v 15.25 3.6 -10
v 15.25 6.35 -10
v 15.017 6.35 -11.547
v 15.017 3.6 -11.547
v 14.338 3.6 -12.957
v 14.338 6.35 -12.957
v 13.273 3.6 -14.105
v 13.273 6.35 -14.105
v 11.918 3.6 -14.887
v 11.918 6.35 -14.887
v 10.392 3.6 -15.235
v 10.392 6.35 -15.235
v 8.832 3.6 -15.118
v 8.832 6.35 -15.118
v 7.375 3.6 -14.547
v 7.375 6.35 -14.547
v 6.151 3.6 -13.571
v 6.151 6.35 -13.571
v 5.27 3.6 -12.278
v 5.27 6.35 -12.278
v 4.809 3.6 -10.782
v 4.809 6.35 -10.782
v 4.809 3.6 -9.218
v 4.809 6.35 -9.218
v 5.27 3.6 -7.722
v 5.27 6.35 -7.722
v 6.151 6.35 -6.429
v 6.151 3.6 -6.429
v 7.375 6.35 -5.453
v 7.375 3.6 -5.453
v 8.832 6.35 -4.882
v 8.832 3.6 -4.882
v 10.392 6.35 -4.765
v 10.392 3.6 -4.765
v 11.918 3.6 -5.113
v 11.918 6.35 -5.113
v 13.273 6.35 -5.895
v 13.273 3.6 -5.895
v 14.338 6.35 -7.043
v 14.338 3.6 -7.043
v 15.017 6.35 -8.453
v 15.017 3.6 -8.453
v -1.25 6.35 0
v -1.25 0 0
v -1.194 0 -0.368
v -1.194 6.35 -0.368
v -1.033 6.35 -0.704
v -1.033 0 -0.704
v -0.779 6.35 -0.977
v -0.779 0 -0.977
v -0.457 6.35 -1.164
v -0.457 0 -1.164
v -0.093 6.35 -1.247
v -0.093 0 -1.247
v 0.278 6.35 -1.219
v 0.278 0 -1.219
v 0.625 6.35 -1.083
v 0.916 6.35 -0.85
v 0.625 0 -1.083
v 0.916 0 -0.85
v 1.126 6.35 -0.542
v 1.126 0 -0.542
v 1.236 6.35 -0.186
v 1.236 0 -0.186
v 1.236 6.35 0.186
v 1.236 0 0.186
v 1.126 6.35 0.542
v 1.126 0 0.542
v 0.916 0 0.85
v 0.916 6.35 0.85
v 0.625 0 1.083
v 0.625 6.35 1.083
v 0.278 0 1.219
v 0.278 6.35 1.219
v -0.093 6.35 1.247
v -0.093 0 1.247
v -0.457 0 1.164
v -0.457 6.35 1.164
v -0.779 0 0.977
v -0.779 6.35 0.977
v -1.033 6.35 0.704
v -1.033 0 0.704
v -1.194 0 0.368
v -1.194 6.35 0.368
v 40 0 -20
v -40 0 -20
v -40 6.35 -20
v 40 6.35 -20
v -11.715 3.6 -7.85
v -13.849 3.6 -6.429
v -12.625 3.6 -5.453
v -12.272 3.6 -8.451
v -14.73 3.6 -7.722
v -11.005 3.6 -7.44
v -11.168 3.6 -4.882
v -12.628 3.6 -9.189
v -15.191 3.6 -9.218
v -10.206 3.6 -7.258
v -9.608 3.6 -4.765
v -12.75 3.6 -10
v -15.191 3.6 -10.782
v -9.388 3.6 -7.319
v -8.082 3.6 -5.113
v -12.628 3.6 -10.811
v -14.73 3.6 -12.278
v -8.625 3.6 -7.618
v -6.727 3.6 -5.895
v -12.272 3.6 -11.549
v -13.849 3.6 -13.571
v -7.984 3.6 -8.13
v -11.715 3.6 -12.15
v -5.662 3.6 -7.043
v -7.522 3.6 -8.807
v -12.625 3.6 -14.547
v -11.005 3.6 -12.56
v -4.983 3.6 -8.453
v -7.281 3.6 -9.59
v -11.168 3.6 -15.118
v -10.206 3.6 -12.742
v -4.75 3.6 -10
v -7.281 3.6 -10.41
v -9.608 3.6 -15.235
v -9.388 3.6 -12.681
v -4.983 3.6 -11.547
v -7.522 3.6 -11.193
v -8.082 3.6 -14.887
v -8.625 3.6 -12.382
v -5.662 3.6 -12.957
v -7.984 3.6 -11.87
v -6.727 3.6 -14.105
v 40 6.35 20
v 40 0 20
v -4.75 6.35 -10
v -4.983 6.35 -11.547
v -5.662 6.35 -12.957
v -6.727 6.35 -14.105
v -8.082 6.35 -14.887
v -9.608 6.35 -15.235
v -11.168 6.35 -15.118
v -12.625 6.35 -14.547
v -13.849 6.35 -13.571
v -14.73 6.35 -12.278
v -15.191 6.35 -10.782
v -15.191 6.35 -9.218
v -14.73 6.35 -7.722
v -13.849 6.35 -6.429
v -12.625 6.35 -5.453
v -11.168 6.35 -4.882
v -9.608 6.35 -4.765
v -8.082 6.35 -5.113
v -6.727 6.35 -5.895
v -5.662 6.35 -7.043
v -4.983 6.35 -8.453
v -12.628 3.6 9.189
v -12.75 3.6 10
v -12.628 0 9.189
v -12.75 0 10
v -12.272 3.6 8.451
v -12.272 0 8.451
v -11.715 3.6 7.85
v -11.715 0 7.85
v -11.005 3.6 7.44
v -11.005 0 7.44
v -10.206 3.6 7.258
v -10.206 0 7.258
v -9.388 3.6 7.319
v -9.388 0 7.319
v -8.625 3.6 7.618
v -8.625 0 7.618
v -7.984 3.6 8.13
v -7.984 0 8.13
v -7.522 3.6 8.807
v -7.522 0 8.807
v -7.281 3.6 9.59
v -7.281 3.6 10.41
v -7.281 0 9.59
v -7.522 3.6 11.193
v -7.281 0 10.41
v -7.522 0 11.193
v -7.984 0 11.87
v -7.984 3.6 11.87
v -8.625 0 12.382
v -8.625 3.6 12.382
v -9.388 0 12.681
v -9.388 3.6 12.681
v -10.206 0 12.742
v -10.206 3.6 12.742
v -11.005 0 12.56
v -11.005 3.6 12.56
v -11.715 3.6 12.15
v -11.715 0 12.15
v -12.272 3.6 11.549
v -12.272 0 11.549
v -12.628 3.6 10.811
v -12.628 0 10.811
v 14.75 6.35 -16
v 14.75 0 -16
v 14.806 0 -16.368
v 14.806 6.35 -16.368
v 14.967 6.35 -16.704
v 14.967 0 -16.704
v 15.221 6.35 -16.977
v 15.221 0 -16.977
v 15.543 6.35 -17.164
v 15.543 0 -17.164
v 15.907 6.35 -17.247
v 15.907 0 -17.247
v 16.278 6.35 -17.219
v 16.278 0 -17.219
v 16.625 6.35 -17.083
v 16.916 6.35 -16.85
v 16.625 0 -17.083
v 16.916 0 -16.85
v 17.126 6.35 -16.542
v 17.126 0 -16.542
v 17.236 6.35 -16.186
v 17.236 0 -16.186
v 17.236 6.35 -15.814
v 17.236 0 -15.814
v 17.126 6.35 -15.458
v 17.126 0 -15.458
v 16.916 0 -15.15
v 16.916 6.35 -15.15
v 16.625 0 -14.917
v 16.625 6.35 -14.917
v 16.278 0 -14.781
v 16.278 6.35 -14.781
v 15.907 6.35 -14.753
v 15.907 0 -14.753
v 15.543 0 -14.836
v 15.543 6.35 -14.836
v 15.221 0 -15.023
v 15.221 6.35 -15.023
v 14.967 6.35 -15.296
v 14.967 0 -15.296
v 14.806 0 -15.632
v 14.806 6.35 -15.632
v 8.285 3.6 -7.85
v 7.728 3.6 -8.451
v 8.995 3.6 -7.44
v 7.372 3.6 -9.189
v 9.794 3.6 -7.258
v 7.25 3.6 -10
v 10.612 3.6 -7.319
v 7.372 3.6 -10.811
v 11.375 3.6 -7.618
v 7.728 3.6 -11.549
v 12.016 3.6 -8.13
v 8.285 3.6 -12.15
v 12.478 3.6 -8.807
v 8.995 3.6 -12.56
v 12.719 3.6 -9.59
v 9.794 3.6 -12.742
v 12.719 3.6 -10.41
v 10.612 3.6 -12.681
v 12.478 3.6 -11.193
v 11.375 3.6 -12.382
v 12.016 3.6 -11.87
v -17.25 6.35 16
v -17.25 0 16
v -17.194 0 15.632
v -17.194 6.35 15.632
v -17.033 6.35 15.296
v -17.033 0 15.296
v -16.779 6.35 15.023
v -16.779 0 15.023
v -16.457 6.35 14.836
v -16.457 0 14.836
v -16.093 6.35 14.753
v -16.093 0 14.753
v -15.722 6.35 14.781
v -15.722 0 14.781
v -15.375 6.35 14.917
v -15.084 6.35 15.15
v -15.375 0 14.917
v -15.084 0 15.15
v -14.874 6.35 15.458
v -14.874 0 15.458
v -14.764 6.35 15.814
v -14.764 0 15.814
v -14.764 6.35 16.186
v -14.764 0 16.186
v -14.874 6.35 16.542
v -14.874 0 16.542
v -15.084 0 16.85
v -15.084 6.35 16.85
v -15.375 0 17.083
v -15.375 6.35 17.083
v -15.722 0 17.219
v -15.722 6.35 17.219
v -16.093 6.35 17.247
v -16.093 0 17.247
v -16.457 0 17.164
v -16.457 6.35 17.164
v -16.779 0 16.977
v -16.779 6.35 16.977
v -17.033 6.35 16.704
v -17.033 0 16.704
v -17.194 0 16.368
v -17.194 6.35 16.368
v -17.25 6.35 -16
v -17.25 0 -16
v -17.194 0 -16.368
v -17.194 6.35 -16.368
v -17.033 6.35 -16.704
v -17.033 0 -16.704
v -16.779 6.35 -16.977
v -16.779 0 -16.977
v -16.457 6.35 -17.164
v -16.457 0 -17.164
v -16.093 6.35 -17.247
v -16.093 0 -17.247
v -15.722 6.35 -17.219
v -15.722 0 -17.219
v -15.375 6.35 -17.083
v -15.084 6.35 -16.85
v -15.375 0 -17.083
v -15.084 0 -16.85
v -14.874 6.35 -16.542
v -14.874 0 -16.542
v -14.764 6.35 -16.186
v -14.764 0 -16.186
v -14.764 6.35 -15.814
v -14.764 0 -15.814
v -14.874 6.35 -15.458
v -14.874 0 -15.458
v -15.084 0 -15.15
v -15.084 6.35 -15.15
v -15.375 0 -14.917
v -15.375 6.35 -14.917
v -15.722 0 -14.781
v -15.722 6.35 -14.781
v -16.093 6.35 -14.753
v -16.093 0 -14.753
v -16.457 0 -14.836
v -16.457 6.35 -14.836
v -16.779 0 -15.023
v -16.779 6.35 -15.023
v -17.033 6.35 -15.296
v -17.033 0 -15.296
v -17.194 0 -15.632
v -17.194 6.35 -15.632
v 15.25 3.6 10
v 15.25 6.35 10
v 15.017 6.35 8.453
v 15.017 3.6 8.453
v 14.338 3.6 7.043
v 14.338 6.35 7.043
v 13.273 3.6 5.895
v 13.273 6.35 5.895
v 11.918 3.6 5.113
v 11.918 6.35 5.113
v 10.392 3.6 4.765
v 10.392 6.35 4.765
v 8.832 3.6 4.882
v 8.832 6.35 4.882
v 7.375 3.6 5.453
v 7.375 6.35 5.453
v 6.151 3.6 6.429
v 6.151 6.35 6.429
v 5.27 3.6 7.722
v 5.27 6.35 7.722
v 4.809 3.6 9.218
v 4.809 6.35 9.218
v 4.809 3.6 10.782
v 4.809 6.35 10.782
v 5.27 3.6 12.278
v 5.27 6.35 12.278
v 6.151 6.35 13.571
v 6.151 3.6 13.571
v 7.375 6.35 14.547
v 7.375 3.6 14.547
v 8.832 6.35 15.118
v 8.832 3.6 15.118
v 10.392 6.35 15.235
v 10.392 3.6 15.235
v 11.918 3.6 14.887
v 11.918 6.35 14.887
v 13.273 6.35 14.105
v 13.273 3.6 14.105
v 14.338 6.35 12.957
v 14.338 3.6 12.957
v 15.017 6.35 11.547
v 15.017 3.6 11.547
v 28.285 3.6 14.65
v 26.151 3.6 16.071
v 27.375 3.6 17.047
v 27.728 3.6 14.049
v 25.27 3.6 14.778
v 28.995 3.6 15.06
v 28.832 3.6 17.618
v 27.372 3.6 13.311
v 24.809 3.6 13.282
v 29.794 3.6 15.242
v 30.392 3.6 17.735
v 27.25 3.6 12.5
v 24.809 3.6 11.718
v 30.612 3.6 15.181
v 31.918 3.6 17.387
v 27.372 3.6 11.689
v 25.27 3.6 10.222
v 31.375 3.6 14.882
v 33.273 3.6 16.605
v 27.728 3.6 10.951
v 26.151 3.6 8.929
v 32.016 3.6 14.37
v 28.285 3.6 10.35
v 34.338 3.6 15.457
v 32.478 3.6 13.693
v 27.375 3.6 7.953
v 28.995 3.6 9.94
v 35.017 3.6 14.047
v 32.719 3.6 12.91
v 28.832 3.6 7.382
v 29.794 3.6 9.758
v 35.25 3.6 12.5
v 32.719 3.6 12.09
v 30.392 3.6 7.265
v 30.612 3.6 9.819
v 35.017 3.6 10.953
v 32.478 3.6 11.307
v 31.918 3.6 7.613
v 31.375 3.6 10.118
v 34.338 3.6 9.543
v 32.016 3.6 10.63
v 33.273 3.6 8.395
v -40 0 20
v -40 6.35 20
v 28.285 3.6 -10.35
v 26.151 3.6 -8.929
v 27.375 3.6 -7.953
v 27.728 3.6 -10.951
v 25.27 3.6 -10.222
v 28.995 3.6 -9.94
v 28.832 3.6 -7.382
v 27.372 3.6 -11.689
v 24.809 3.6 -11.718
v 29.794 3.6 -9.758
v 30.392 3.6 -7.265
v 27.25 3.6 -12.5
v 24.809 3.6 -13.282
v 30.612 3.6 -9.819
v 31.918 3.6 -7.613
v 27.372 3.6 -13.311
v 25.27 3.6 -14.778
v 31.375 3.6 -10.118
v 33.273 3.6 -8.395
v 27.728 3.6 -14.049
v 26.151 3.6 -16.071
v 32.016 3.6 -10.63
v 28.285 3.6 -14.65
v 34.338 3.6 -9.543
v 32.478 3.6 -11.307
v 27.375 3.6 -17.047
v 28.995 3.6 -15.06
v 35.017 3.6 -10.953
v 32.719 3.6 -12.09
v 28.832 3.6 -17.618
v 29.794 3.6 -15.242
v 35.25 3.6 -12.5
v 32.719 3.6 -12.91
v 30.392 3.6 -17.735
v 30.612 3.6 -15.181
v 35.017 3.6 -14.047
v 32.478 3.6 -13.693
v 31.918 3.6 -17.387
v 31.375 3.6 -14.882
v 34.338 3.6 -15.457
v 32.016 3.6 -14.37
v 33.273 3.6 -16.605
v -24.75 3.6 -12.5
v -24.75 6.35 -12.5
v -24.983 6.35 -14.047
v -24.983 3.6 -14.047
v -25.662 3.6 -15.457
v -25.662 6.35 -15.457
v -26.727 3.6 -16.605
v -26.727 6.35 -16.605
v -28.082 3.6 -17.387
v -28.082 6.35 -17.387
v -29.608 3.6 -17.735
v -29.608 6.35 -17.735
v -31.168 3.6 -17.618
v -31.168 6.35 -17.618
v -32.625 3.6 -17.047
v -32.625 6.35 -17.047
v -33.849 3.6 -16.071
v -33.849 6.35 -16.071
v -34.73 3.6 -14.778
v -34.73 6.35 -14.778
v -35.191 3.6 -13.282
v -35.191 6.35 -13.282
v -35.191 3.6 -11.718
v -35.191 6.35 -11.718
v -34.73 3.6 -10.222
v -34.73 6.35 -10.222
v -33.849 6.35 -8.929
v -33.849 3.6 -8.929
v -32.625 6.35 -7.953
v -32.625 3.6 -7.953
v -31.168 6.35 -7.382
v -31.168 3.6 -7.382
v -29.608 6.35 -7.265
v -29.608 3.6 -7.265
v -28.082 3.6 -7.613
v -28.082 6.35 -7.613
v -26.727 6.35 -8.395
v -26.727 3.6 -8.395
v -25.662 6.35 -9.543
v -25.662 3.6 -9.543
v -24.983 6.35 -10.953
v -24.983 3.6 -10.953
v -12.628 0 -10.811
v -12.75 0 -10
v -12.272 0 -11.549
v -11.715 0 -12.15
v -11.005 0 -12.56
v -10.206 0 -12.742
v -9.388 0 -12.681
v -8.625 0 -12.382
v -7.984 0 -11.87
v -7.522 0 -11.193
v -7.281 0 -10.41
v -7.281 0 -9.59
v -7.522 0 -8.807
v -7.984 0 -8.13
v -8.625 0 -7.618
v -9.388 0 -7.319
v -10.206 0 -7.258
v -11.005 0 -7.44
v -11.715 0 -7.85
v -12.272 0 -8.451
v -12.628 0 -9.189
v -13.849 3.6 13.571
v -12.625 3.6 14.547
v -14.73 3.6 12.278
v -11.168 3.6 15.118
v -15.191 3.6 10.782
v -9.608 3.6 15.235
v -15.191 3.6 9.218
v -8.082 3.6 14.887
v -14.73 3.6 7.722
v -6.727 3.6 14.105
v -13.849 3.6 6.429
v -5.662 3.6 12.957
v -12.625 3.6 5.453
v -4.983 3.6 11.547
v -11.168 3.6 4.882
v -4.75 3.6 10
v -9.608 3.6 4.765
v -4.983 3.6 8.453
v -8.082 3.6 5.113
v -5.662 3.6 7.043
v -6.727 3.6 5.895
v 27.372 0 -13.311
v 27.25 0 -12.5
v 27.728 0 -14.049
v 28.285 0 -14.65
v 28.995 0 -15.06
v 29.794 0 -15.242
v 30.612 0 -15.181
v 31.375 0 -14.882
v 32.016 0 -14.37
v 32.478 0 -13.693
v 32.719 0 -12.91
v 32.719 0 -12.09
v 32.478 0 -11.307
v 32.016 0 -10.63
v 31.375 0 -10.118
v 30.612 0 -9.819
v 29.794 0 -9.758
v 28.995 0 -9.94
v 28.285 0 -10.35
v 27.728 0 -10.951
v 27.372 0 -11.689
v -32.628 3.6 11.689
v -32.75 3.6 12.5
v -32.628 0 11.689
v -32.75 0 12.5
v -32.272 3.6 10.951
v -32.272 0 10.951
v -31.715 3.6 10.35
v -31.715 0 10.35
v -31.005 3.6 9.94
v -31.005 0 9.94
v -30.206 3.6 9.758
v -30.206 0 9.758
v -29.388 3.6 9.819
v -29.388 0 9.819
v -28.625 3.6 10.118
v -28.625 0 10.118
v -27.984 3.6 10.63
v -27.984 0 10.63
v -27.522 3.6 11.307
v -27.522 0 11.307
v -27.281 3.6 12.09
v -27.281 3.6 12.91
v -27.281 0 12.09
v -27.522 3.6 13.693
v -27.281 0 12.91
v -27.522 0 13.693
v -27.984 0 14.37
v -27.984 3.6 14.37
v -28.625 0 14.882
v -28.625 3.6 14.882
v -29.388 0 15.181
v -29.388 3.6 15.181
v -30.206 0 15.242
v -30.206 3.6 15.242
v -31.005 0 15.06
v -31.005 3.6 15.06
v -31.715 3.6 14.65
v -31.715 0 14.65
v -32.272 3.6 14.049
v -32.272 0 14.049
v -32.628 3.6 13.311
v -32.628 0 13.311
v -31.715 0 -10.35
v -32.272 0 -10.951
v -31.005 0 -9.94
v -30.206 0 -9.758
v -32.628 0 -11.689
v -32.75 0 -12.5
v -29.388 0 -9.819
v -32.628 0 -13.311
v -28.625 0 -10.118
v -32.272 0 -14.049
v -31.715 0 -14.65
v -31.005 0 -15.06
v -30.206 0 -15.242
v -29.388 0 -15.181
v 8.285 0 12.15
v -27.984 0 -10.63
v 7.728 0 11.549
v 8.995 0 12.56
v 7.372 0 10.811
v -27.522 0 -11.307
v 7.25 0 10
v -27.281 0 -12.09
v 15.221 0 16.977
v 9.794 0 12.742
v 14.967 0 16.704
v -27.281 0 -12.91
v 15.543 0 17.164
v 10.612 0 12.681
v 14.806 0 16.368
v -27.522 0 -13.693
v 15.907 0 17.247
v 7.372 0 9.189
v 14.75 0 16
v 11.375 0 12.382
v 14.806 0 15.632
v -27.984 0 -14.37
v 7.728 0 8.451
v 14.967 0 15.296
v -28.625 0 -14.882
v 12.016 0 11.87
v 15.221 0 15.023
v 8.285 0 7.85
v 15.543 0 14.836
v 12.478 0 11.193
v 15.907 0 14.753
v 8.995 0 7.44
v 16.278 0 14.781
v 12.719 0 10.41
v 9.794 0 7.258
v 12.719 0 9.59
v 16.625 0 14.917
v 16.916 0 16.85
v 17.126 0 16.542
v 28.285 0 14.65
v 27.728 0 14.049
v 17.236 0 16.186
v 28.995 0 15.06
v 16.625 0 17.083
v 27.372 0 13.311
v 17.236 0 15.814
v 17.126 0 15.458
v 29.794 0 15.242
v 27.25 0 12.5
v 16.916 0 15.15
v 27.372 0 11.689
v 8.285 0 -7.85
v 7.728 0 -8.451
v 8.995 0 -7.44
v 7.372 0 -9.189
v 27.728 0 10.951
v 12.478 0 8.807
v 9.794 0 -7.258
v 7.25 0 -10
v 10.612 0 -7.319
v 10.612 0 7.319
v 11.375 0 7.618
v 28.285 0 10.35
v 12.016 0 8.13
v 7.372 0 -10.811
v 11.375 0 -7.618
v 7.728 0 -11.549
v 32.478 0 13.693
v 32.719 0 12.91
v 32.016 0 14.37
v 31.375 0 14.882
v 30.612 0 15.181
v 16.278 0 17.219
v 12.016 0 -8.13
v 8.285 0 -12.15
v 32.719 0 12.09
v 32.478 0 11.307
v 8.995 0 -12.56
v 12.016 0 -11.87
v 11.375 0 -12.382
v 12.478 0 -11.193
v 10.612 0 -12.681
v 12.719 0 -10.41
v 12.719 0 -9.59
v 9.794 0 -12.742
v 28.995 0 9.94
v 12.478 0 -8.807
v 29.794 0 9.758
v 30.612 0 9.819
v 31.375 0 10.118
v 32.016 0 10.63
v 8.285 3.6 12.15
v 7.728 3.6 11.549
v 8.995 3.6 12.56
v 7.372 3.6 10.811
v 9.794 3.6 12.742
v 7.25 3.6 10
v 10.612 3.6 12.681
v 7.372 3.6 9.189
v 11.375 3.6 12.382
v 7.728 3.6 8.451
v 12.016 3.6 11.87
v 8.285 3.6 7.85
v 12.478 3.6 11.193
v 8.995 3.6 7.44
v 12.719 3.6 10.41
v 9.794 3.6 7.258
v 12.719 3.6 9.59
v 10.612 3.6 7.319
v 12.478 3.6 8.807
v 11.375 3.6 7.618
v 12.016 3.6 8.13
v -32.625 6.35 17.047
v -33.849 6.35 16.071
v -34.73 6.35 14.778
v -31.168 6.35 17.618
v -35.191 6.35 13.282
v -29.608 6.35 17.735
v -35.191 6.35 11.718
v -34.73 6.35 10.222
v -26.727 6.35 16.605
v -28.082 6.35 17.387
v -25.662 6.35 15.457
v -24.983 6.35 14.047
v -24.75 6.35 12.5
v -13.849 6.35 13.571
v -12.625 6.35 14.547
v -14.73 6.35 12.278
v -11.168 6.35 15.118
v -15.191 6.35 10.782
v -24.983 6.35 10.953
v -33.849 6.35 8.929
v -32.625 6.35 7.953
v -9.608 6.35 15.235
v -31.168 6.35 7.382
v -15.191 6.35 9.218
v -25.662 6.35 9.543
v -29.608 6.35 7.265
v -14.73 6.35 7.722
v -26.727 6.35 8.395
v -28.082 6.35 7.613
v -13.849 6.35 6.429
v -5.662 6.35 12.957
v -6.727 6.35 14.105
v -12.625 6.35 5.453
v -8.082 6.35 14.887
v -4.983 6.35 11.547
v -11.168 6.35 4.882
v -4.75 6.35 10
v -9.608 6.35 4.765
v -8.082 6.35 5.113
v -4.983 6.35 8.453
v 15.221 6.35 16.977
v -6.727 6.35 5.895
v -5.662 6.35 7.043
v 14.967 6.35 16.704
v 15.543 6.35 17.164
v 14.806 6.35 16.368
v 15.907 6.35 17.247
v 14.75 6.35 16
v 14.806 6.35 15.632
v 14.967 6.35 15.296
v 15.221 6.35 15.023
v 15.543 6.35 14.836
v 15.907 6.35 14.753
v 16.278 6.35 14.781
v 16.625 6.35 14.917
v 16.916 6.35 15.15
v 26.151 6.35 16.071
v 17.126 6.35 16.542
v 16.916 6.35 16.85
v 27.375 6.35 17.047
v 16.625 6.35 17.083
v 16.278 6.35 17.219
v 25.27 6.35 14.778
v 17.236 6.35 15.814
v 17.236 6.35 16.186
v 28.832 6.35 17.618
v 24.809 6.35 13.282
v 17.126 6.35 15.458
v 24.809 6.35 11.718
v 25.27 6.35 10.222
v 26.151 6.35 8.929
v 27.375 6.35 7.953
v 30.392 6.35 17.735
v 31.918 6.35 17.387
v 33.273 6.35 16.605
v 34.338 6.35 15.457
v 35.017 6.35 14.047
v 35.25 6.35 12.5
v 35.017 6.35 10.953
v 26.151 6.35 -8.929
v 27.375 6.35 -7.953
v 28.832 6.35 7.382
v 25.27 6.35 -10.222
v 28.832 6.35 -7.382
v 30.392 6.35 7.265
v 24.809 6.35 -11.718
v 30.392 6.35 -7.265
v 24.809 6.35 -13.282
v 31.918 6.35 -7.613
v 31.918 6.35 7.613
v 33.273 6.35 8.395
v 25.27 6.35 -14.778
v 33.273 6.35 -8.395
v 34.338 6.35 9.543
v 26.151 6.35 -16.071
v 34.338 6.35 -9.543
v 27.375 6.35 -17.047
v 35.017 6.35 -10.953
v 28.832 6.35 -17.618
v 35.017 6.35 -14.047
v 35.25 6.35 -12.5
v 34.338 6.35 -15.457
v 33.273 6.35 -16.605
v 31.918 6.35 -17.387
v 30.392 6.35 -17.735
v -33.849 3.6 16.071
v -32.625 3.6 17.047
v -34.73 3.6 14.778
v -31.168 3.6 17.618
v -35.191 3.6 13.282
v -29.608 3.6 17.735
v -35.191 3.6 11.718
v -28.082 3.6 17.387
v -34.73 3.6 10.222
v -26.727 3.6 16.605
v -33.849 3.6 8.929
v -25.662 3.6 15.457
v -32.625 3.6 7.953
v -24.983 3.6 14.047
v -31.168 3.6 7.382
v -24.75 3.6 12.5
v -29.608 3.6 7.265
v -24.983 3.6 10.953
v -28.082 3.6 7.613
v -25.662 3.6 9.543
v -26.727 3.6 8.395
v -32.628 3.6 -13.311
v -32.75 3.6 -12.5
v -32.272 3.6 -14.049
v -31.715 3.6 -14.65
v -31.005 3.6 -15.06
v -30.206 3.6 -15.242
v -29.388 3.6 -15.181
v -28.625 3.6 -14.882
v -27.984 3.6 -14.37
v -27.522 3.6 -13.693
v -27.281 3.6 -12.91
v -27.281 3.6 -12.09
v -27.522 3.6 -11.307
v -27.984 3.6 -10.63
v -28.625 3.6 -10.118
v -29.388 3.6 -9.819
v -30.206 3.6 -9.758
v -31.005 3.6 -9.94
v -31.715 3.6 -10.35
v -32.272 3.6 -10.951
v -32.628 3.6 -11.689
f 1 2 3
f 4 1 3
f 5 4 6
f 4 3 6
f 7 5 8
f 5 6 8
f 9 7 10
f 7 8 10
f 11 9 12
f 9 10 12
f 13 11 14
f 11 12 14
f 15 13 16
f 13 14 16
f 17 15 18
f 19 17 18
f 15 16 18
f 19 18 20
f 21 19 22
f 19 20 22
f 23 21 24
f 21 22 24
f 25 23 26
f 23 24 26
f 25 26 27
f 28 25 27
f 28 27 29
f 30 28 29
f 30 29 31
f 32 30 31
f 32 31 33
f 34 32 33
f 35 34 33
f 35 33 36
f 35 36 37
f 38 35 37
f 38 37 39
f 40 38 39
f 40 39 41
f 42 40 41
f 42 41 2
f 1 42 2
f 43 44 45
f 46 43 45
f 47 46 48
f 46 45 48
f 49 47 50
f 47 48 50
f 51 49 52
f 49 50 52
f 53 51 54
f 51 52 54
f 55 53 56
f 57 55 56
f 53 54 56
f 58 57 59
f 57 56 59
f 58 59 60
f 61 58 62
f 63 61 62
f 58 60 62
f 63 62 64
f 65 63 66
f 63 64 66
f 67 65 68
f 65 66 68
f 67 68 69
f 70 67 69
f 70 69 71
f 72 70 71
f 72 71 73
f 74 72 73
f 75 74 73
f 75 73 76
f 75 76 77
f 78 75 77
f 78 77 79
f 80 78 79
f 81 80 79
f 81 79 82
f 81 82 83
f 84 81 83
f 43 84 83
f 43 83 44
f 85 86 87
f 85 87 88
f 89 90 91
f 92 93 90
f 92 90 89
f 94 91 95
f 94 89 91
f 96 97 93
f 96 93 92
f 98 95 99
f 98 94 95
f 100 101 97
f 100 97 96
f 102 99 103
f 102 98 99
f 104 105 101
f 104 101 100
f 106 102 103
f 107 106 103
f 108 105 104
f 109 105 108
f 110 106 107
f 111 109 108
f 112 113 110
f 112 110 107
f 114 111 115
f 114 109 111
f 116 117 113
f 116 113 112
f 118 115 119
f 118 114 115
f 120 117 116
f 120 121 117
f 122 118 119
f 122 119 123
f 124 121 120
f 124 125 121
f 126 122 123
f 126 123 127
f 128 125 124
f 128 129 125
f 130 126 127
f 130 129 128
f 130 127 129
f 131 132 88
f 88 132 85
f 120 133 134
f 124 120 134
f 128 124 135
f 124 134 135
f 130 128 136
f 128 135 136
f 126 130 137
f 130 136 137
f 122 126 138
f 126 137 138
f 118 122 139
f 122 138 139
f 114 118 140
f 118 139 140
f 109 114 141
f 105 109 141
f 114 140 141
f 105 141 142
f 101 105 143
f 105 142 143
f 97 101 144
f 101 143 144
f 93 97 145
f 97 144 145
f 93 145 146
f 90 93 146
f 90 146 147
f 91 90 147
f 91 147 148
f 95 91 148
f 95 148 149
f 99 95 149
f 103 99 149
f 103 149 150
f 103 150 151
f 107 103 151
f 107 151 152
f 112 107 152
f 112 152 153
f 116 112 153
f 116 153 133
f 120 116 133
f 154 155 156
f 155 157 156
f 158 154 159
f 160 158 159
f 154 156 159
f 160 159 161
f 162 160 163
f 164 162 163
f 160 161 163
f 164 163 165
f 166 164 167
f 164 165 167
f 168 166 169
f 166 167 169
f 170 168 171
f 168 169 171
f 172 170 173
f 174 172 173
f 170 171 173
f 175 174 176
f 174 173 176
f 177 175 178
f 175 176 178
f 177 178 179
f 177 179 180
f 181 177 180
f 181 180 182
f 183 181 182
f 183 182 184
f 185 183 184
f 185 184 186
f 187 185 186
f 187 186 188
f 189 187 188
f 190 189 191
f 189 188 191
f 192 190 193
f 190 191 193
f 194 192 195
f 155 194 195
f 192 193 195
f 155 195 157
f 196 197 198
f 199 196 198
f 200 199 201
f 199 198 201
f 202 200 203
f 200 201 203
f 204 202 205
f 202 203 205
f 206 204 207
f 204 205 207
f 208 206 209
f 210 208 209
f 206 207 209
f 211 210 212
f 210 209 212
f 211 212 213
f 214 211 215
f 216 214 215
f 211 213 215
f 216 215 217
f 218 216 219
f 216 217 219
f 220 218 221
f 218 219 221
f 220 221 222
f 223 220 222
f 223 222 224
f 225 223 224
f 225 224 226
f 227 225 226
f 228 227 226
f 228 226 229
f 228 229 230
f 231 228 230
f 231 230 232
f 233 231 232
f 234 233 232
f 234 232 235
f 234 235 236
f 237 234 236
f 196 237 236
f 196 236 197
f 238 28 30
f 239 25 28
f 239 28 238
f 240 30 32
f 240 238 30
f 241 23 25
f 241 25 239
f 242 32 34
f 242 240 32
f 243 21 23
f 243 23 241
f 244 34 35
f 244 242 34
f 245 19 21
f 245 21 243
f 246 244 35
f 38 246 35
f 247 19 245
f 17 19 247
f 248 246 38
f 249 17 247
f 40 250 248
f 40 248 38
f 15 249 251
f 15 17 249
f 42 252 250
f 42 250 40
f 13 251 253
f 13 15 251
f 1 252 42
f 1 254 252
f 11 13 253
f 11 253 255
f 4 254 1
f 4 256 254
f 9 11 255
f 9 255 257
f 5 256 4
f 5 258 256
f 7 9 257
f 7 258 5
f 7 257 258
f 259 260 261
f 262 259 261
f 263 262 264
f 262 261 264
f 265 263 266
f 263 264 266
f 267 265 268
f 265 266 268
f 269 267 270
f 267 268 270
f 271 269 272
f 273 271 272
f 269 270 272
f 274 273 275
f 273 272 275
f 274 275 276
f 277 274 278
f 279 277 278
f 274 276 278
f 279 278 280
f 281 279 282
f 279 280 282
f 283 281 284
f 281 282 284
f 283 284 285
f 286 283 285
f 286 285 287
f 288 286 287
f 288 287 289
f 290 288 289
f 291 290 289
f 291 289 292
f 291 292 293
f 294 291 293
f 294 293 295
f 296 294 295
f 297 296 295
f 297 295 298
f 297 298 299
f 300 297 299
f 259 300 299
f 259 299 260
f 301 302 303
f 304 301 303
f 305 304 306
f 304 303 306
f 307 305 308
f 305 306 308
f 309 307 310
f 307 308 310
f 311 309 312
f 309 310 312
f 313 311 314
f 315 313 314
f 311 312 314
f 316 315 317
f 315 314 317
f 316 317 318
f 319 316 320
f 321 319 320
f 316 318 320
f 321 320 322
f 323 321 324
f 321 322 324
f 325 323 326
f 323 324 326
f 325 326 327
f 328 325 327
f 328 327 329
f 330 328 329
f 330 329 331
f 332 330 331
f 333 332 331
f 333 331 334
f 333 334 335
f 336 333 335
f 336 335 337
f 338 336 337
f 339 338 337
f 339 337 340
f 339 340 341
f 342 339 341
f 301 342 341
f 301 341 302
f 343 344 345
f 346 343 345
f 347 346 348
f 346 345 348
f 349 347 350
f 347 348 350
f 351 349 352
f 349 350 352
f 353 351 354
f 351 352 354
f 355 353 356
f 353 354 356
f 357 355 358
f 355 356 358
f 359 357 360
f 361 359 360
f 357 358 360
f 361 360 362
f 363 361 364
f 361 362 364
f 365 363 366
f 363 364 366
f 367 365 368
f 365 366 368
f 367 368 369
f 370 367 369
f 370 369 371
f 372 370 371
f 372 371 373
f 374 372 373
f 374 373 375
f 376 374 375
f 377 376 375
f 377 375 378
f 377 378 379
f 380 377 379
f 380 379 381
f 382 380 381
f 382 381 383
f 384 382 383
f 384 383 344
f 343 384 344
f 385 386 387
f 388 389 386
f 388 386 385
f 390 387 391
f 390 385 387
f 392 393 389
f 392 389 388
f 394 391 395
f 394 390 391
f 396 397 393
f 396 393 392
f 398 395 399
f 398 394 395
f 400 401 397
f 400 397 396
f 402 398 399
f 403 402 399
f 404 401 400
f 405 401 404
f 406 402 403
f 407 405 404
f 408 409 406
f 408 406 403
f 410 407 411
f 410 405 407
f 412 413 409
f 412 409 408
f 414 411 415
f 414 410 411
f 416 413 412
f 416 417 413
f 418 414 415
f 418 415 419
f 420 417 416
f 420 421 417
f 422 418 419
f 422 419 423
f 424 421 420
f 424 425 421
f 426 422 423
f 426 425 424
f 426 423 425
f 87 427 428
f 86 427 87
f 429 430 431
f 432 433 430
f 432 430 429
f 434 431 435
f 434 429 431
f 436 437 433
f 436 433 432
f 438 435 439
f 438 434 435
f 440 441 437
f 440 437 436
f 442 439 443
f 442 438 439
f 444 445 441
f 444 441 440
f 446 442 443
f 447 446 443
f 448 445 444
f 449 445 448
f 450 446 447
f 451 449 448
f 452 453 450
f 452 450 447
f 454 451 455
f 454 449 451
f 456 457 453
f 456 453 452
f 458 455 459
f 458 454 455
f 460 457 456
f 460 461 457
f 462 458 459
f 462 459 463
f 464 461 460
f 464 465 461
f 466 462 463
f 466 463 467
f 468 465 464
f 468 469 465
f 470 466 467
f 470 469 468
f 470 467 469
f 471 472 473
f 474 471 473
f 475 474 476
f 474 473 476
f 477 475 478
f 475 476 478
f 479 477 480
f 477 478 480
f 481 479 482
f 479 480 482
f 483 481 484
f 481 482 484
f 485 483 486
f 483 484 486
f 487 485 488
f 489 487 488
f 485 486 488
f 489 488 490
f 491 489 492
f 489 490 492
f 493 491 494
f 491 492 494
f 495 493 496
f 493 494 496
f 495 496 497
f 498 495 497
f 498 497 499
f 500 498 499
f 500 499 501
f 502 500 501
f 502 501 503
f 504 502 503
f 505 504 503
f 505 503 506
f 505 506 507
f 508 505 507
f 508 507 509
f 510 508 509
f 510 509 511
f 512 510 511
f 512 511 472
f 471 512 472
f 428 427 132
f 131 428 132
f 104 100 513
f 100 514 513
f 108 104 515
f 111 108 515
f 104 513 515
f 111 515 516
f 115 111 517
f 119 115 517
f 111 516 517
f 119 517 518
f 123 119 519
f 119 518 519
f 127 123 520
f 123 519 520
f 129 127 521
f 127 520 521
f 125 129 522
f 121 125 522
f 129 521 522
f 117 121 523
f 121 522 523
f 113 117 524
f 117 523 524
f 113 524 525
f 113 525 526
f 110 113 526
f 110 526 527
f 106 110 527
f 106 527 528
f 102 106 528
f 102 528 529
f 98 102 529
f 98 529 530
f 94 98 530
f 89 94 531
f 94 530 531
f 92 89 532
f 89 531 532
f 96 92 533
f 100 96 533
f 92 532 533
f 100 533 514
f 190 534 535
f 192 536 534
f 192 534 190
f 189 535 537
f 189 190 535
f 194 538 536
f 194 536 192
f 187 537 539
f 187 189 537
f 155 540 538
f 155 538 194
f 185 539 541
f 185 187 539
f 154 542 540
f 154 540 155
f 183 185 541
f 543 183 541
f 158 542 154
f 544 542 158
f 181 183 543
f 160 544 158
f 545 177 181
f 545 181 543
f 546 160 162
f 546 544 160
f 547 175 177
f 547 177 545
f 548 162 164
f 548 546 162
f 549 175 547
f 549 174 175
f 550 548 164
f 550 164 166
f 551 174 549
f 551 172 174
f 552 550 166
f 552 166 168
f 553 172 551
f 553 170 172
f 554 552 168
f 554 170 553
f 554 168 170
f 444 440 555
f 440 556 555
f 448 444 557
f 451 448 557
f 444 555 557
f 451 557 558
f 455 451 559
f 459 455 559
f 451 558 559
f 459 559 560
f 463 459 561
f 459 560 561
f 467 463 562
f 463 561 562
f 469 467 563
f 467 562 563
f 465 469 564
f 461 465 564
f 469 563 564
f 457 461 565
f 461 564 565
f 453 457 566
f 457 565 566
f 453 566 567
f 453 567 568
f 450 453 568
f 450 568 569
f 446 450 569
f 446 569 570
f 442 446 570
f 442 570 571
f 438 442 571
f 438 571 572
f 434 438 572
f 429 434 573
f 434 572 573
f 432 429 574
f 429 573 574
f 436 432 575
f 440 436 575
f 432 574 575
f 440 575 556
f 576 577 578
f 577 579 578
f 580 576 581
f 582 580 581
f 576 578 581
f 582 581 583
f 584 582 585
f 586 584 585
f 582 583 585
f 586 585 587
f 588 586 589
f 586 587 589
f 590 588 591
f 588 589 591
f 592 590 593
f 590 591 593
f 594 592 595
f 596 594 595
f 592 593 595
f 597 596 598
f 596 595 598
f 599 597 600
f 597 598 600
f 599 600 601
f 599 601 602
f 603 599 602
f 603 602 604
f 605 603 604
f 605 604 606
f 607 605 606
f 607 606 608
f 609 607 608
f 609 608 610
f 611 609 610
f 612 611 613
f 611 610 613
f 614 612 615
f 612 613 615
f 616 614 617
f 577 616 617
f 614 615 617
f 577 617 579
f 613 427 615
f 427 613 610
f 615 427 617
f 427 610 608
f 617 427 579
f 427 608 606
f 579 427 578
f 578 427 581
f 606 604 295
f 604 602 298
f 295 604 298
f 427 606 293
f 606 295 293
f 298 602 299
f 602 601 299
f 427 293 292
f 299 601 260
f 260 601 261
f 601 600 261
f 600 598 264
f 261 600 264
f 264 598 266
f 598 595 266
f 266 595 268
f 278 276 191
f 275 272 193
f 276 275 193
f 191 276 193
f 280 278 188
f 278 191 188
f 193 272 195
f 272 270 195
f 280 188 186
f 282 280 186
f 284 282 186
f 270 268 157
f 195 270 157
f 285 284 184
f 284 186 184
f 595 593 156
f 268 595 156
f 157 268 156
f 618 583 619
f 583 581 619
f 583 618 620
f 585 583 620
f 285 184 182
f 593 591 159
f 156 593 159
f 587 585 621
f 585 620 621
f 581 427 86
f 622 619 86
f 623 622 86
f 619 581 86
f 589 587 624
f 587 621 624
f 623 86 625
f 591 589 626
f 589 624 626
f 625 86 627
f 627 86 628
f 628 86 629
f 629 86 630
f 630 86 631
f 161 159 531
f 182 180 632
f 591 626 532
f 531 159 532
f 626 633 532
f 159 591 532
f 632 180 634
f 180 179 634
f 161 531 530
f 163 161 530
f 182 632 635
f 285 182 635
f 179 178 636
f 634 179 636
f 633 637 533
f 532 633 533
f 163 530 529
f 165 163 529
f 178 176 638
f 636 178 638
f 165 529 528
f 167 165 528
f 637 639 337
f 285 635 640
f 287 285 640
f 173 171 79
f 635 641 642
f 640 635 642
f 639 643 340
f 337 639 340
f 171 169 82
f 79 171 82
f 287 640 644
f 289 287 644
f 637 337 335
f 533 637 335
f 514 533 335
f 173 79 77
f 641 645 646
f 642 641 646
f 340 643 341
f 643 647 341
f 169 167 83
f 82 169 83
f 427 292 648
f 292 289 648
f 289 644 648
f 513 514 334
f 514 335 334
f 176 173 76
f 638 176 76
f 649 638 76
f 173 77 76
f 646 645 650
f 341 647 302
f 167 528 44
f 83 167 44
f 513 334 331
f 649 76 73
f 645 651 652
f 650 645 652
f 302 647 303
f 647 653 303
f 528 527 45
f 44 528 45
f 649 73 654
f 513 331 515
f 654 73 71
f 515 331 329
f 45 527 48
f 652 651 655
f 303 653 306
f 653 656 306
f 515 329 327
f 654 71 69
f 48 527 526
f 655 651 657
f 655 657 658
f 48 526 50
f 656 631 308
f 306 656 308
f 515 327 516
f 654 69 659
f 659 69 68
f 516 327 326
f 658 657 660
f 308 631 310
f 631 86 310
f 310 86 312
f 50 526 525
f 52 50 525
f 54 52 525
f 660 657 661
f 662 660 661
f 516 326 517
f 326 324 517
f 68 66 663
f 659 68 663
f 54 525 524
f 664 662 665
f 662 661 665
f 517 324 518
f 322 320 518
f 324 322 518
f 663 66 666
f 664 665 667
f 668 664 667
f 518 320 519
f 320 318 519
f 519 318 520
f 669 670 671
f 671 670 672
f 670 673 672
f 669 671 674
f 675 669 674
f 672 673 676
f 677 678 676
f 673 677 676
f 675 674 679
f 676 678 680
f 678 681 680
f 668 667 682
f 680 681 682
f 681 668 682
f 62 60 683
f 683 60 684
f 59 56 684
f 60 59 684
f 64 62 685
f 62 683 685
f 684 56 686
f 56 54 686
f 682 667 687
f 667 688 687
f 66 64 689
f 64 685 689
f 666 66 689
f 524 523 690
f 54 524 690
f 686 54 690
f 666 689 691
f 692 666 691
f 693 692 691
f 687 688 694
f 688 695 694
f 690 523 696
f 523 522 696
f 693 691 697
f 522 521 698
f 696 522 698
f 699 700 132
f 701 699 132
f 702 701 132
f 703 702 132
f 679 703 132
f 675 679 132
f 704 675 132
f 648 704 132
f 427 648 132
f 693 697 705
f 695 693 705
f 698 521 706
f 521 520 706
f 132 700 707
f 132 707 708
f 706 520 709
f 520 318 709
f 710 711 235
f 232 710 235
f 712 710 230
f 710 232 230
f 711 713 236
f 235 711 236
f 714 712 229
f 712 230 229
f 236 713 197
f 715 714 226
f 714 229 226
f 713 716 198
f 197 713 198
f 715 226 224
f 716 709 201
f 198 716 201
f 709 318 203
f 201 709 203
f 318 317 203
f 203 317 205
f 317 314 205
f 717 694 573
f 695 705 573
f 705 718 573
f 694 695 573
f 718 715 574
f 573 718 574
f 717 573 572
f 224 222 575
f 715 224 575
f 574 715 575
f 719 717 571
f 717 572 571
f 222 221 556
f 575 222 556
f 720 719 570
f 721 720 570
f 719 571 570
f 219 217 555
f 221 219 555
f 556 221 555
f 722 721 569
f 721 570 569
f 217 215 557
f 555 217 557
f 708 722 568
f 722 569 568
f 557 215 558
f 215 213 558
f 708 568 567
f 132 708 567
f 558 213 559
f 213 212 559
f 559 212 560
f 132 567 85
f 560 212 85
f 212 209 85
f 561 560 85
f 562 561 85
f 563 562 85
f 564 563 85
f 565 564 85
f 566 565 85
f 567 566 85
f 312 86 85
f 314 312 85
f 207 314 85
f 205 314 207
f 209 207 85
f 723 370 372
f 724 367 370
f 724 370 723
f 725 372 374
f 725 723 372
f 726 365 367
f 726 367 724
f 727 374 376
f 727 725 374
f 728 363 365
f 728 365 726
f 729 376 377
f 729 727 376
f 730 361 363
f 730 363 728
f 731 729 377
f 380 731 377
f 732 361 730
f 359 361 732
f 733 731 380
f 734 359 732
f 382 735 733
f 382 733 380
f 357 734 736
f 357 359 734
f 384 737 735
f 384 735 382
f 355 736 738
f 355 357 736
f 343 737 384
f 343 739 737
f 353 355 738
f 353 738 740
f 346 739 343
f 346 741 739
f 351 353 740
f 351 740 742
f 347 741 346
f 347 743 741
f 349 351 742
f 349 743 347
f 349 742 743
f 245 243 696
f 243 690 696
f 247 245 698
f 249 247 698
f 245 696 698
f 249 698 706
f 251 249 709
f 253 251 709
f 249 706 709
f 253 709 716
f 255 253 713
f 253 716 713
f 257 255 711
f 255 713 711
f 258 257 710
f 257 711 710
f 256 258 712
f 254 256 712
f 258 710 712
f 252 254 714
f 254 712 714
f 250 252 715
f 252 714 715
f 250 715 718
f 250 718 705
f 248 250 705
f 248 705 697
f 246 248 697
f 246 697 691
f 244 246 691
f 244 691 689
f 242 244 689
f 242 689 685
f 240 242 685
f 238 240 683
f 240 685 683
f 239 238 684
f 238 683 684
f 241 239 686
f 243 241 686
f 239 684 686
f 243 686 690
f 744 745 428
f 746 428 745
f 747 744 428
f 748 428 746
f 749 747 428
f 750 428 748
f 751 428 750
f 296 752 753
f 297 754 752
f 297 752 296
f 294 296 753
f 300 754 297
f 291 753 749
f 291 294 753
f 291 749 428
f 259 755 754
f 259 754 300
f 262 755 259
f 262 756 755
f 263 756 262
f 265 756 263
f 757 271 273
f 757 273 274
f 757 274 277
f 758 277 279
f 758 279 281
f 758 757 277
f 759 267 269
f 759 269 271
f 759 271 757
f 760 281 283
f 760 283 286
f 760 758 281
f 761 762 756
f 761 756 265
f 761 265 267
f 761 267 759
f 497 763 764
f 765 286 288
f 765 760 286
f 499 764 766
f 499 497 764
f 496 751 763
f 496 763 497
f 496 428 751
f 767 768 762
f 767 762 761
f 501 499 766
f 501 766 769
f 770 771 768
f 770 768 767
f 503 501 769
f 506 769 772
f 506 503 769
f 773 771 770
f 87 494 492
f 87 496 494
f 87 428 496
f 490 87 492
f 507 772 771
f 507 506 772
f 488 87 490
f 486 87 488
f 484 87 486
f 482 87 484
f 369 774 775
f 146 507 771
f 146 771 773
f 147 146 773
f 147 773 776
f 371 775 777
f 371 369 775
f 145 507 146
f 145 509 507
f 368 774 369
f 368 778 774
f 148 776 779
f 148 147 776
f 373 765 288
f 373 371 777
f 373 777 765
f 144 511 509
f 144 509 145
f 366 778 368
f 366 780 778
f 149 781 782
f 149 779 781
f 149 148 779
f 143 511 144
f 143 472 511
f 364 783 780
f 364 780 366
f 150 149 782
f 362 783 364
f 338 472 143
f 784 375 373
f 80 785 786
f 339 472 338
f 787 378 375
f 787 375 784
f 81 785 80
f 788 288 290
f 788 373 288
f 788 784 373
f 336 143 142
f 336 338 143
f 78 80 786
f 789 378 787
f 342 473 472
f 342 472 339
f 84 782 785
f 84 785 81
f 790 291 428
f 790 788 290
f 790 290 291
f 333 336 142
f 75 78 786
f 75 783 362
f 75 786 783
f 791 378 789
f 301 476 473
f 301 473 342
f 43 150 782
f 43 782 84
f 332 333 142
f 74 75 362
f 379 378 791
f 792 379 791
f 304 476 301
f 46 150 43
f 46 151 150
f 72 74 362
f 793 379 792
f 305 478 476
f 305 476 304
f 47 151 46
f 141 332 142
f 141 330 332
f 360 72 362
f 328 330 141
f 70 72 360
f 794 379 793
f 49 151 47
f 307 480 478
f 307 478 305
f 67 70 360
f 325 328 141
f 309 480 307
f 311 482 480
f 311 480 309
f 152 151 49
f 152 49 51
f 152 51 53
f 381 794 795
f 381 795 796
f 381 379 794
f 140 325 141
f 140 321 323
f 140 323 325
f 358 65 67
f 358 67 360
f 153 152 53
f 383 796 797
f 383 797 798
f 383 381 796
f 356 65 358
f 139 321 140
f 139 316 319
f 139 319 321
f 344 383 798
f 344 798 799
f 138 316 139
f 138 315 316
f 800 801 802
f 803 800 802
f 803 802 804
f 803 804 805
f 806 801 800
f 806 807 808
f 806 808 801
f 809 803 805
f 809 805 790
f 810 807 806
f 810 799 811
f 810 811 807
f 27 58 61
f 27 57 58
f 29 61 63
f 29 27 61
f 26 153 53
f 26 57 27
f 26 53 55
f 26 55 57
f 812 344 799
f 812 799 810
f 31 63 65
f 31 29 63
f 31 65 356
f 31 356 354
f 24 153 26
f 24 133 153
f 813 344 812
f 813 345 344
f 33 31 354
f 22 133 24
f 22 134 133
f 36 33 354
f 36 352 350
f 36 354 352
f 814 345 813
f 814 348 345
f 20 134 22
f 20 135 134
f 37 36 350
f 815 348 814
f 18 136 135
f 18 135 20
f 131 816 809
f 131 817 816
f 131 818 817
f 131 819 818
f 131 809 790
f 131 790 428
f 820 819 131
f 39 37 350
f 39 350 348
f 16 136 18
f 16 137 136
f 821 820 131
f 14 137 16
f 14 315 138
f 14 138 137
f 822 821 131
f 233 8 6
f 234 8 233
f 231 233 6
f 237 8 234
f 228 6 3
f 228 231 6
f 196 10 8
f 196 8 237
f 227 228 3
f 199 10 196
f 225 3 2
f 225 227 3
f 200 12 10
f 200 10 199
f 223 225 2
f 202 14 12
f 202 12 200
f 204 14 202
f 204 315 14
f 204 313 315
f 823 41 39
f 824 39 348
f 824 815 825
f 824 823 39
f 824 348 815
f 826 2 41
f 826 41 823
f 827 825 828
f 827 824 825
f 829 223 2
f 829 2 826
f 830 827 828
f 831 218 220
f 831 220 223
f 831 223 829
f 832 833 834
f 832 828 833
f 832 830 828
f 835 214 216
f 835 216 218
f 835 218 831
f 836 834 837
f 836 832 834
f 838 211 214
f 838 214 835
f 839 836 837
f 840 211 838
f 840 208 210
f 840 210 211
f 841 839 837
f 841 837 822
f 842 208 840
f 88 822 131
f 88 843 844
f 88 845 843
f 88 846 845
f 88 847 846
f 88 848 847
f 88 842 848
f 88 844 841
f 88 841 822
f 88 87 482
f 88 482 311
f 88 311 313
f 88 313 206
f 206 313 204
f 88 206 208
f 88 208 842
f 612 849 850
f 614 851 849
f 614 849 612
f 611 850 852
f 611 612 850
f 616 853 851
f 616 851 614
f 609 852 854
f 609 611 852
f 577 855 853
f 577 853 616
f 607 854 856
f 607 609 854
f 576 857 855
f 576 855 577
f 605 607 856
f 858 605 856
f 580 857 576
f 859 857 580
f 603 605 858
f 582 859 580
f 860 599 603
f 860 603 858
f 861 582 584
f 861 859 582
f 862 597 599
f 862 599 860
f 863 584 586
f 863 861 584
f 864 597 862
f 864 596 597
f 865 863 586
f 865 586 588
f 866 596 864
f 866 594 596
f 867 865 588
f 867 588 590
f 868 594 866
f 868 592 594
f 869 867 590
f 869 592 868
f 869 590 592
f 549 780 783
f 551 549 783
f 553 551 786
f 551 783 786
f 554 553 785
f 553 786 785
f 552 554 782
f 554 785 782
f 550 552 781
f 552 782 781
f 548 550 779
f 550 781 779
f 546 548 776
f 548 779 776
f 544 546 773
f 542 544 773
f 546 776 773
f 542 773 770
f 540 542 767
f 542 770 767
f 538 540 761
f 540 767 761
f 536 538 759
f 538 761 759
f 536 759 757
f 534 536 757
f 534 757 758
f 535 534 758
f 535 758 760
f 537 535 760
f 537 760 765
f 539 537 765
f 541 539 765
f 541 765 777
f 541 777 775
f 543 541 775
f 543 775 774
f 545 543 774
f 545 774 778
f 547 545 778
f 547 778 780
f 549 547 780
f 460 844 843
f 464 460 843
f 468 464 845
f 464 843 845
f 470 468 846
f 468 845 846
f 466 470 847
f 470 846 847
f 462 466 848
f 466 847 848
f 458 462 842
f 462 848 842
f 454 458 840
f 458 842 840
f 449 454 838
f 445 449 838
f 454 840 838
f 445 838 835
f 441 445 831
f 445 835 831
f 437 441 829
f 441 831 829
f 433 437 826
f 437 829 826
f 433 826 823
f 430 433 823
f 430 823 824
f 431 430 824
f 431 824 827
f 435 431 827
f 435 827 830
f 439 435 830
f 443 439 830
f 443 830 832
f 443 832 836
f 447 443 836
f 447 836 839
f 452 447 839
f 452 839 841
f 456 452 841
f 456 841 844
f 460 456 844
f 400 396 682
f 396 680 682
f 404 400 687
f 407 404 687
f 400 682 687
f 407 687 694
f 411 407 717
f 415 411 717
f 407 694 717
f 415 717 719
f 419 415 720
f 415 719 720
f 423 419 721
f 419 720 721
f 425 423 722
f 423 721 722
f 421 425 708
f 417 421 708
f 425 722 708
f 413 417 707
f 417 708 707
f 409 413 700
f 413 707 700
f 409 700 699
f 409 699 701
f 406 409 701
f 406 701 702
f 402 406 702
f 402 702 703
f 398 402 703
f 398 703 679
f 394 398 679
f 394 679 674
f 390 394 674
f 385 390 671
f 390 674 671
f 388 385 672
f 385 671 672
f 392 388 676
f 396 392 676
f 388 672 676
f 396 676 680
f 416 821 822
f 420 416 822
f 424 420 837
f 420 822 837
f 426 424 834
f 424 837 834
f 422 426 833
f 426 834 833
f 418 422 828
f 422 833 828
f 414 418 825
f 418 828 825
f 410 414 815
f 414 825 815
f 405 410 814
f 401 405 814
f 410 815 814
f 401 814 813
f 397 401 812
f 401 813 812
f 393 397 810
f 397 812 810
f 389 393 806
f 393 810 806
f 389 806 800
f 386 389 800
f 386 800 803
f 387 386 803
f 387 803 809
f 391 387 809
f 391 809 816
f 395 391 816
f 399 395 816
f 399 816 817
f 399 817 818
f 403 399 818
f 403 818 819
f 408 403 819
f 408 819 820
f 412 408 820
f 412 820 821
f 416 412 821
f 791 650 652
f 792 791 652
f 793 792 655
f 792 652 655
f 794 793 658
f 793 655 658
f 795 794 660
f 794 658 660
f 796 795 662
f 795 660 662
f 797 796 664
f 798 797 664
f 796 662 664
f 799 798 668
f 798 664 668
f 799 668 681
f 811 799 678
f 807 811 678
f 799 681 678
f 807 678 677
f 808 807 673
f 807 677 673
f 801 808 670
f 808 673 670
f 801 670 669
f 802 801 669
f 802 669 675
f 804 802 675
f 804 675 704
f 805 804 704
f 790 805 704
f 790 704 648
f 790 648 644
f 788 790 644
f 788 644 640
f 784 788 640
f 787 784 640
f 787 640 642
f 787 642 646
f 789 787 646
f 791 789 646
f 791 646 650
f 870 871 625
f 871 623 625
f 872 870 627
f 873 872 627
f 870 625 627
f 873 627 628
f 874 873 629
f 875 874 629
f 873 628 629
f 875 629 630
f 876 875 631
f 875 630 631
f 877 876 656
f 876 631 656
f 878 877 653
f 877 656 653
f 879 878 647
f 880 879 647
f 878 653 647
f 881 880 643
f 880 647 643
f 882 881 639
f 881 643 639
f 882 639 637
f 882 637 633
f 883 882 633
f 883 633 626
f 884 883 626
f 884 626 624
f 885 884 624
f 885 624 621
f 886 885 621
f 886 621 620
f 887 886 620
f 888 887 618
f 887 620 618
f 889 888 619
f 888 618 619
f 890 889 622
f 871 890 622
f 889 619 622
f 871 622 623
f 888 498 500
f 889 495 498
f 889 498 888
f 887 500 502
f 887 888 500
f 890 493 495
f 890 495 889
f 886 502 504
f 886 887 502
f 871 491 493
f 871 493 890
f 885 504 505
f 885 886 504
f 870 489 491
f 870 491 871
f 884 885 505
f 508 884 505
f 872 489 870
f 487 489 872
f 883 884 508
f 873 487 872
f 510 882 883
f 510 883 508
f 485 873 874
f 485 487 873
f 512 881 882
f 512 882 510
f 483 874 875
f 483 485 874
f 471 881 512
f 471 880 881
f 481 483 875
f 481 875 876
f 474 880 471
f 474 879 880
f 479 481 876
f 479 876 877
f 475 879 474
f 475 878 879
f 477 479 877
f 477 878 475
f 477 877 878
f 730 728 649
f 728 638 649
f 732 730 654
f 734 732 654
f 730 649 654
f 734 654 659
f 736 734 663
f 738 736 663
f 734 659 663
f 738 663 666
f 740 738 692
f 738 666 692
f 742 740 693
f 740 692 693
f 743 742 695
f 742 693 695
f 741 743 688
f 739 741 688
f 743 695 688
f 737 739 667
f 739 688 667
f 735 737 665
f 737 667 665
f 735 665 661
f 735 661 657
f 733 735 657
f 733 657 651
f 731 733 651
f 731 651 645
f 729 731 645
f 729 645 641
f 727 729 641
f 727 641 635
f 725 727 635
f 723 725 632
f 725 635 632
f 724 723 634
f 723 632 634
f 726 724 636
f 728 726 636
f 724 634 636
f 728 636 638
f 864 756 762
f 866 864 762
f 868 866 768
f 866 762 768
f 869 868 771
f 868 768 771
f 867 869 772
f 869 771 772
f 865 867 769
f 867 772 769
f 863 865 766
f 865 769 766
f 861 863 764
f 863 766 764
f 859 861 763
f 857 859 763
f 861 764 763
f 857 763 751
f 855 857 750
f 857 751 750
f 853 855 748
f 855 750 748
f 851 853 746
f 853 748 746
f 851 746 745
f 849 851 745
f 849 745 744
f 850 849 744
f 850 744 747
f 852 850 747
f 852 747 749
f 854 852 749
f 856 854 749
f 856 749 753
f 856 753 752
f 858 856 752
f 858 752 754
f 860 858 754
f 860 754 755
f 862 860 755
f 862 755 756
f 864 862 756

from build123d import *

# Parameters (mm, degrees)
SKETCH1_W                       = 80
SKETCH1_H                       = 40
BOSS_EXTRUDE1_DEPTH             = 6.35
M3X0_5_TAPPED_HOLE2_D           = 2.5
CBORE_FOR_M5_SBHCS1_D           = 5.5
CBORE_FOR_M5_SBHCS1_CBORE_D     = 10.5
CBORE_FOR_M5_SBHCS1_CBORE_DEPTH = 2.75


with BuildPart() as part:
    # Sketch1 → Boss-Extrude1 (new body)
    with BuildSketch(Plane(origin=(0, 0, 0), x_dir=(1, 0, 0), z_dir=(0, 1, 0))):
        Rectangle(SKETCH1_W, SKETCH1_H)
    extrude(amount=BOSS_EXTRUDE1_DEPTH)

    # M3x0.5 Tapped Hole2 (through all)
    with Locations(Plane(origin=(0, 6.35, 0), x_dir=(1, 0, 0), z_dir=(0, 1, 0))):
        with Locations((0, 0), (16, 16), (-16, -16), (-16, 16), (16, -16)):
            Hole(M3X0_5_TAPPED_HOLE2_D / 2)

    # CBORE for M5 SBHCS1 (through all)
    with Locations(Plane(origin=(0, 6.35, 0), x_dir=(1, 0, 0), z_dir=(0, 1, 0))):
        with Locations((10, 10), (30, 12.5), (-30, 12.5), (-10, 10), (30, -12.5), (10, -10), (-10, -10), (-30, -12.5)):
            CounterBoreHole(CBORE_FOR_M5_SBHCS1_D / 2, CBORE_FOR_M5_SBHCS1_CBORE_D / 2, CBORE_FOR_M5_SBHCS1_CBORE_DEPTH)


solid = part.part
